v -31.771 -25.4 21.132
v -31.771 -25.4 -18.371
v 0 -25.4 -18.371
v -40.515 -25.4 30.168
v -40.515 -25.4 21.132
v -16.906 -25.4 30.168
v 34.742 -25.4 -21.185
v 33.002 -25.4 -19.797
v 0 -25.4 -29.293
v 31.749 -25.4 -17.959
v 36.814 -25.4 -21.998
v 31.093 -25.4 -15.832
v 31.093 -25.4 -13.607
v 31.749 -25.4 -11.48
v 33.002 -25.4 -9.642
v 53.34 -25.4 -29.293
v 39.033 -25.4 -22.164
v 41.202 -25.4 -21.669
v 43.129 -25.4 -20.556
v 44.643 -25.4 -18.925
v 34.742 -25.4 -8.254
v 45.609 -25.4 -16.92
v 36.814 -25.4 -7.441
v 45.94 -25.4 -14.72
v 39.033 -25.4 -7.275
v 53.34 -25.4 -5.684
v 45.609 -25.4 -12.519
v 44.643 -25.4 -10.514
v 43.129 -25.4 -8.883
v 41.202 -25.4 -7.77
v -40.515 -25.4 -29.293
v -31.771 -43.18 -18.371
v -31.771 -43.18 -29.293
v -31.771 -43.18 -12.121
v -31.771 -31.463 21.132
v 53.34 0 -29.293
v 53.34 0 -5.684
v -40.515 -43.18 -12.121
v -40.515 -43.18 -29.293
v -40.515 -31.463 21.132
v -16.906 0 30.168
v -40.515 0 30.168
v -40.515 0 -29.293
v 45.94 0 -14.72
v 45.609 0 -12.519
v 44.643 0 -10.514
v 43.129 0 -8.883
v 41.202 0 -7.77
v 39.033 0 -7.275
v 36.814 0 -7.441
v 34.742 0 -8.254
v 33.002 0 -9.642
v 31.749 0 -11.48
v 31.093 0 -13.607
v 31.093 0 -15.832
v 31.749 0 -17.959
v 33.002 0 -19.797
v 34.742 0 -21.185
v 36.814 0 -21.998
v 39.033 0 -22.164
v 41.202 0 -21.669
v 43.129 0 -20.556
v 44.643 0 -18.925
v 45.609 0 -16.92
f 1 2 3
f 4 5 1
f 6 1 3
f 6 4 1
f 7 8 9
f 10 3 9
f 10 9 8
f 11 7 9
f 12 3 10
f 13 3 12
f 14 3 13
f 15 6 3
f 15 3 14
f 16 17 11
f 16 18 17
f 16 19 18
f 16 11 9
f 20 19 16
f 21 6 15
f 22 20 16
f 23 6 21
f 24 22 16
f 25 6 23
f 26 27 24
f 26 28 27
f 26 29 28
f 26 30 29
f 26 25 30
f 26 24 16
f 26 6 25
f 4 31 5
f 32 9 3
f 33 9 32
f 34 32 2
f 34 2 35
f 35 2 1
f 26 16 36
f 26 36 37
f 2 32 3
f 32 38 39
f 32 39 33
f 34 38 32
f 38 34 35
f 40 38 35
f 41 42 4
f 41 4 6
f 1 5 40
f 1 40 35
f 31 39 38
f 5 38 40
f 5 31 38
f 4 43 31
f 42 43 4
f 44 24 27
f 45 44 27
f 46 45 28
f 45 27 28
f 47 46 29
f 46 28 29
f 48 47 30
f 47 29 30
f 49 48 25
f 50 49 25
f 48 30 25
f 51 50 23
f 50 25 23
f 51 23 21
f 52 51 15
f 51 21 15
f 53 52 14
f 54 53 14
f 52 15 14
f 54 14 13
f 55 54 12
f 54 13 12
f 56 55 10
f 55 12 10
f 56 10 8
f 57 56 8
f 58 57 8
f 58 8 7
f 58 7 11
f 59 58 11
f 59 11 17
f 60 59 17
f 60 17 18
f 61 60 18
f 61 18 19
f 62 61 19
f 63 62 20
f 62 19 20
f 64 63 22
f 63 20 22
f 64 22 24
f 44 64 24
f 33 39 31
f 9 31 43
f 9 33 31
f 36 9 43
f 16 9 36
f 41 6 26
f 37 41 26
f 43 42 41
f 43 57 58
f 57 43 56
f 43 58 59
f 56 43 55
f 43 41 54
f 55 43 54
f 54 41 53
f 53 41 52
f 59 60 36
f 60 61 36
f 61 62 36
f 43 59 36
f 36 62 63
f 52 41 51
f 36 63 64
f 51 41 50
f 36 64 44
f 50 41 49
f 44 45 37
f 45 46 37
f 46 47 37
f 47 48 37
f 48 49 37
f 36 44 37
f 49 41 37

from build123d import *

# Parameters (mm, degrees)
F0_W      = 93.855083
F0_H      = 59.460982
F1_DEPTH  = 25.4
F3_DEPTH  = 25.4
F4_W      = 8.744262
F4_H      = 50.425246
F5_DEPTH  = 17.78
F7_DEPTH  = 25.4
F9_DEPTH  = 10.922
F10_R     = 7.465412
F11_DEPTH = 25.4


with BuildPart() as f1:
    # F0 (on Front) → F1 (new body)
    with BuildSketch(Plane.XZ):
        with Locations((6.412457, 0.437213)):
            Rectangle(F0_W, F0_H)
    extrude(amount=F1_DEPTH)

    # F2 (on face) → F3 (cut)
    with BuildSketch(Plane.XZ.offset(25.4)):
        Polygon((53.339999, 30.167704), (-16.905574, 30.167704), (53.339999, -5.683771), align=None)
    extrude(amount=-F3_DEPTH, mode=Mode.SUBTRACT)

    # F4 (on face) → F5 (join)
    with BuildSketch(Plane.XZ.offset(25.4)):
        with Locations((-36.142953, -4.080655)):
            Rectangle(F4_W, F4_H)
    extrude(amount=F5_DEPTH)

    # F6 (on face) → F7 (cut)
    with BuildSketch(Plane.YZ.offset(-31.770822)):
        Polygon((-43.18, -12.12093), (-31.462505, 21.131968), (-43.18, 21.131968), align=None)
    extrude(amount=-F7_DEPTH, mode=Mode.SUBTRACT)

    # F8 (on face) → F9 (join)
    with BuildSketch(Plane(origin=(0, 0, -29.293278), x_dir=(1, 0, 0), z_dir=(0, 0, -1))):
        Polygon((0, 25.4), (-31.770822, 43.18), (-31.770822, 25.4), align=None)
    extrude(amount=-F9_DEPTH)

    # F10 (on face) → F11 (cut)
    with BuildSketch(Plane.XZ.offset(25.4)):
        with Locations((38.474757, -14.719509)):
            Circle(F10_R)
    extrude(amount=-F11_DEPTH, mode=Mode.SUBTRACT)


solid = f1.part
